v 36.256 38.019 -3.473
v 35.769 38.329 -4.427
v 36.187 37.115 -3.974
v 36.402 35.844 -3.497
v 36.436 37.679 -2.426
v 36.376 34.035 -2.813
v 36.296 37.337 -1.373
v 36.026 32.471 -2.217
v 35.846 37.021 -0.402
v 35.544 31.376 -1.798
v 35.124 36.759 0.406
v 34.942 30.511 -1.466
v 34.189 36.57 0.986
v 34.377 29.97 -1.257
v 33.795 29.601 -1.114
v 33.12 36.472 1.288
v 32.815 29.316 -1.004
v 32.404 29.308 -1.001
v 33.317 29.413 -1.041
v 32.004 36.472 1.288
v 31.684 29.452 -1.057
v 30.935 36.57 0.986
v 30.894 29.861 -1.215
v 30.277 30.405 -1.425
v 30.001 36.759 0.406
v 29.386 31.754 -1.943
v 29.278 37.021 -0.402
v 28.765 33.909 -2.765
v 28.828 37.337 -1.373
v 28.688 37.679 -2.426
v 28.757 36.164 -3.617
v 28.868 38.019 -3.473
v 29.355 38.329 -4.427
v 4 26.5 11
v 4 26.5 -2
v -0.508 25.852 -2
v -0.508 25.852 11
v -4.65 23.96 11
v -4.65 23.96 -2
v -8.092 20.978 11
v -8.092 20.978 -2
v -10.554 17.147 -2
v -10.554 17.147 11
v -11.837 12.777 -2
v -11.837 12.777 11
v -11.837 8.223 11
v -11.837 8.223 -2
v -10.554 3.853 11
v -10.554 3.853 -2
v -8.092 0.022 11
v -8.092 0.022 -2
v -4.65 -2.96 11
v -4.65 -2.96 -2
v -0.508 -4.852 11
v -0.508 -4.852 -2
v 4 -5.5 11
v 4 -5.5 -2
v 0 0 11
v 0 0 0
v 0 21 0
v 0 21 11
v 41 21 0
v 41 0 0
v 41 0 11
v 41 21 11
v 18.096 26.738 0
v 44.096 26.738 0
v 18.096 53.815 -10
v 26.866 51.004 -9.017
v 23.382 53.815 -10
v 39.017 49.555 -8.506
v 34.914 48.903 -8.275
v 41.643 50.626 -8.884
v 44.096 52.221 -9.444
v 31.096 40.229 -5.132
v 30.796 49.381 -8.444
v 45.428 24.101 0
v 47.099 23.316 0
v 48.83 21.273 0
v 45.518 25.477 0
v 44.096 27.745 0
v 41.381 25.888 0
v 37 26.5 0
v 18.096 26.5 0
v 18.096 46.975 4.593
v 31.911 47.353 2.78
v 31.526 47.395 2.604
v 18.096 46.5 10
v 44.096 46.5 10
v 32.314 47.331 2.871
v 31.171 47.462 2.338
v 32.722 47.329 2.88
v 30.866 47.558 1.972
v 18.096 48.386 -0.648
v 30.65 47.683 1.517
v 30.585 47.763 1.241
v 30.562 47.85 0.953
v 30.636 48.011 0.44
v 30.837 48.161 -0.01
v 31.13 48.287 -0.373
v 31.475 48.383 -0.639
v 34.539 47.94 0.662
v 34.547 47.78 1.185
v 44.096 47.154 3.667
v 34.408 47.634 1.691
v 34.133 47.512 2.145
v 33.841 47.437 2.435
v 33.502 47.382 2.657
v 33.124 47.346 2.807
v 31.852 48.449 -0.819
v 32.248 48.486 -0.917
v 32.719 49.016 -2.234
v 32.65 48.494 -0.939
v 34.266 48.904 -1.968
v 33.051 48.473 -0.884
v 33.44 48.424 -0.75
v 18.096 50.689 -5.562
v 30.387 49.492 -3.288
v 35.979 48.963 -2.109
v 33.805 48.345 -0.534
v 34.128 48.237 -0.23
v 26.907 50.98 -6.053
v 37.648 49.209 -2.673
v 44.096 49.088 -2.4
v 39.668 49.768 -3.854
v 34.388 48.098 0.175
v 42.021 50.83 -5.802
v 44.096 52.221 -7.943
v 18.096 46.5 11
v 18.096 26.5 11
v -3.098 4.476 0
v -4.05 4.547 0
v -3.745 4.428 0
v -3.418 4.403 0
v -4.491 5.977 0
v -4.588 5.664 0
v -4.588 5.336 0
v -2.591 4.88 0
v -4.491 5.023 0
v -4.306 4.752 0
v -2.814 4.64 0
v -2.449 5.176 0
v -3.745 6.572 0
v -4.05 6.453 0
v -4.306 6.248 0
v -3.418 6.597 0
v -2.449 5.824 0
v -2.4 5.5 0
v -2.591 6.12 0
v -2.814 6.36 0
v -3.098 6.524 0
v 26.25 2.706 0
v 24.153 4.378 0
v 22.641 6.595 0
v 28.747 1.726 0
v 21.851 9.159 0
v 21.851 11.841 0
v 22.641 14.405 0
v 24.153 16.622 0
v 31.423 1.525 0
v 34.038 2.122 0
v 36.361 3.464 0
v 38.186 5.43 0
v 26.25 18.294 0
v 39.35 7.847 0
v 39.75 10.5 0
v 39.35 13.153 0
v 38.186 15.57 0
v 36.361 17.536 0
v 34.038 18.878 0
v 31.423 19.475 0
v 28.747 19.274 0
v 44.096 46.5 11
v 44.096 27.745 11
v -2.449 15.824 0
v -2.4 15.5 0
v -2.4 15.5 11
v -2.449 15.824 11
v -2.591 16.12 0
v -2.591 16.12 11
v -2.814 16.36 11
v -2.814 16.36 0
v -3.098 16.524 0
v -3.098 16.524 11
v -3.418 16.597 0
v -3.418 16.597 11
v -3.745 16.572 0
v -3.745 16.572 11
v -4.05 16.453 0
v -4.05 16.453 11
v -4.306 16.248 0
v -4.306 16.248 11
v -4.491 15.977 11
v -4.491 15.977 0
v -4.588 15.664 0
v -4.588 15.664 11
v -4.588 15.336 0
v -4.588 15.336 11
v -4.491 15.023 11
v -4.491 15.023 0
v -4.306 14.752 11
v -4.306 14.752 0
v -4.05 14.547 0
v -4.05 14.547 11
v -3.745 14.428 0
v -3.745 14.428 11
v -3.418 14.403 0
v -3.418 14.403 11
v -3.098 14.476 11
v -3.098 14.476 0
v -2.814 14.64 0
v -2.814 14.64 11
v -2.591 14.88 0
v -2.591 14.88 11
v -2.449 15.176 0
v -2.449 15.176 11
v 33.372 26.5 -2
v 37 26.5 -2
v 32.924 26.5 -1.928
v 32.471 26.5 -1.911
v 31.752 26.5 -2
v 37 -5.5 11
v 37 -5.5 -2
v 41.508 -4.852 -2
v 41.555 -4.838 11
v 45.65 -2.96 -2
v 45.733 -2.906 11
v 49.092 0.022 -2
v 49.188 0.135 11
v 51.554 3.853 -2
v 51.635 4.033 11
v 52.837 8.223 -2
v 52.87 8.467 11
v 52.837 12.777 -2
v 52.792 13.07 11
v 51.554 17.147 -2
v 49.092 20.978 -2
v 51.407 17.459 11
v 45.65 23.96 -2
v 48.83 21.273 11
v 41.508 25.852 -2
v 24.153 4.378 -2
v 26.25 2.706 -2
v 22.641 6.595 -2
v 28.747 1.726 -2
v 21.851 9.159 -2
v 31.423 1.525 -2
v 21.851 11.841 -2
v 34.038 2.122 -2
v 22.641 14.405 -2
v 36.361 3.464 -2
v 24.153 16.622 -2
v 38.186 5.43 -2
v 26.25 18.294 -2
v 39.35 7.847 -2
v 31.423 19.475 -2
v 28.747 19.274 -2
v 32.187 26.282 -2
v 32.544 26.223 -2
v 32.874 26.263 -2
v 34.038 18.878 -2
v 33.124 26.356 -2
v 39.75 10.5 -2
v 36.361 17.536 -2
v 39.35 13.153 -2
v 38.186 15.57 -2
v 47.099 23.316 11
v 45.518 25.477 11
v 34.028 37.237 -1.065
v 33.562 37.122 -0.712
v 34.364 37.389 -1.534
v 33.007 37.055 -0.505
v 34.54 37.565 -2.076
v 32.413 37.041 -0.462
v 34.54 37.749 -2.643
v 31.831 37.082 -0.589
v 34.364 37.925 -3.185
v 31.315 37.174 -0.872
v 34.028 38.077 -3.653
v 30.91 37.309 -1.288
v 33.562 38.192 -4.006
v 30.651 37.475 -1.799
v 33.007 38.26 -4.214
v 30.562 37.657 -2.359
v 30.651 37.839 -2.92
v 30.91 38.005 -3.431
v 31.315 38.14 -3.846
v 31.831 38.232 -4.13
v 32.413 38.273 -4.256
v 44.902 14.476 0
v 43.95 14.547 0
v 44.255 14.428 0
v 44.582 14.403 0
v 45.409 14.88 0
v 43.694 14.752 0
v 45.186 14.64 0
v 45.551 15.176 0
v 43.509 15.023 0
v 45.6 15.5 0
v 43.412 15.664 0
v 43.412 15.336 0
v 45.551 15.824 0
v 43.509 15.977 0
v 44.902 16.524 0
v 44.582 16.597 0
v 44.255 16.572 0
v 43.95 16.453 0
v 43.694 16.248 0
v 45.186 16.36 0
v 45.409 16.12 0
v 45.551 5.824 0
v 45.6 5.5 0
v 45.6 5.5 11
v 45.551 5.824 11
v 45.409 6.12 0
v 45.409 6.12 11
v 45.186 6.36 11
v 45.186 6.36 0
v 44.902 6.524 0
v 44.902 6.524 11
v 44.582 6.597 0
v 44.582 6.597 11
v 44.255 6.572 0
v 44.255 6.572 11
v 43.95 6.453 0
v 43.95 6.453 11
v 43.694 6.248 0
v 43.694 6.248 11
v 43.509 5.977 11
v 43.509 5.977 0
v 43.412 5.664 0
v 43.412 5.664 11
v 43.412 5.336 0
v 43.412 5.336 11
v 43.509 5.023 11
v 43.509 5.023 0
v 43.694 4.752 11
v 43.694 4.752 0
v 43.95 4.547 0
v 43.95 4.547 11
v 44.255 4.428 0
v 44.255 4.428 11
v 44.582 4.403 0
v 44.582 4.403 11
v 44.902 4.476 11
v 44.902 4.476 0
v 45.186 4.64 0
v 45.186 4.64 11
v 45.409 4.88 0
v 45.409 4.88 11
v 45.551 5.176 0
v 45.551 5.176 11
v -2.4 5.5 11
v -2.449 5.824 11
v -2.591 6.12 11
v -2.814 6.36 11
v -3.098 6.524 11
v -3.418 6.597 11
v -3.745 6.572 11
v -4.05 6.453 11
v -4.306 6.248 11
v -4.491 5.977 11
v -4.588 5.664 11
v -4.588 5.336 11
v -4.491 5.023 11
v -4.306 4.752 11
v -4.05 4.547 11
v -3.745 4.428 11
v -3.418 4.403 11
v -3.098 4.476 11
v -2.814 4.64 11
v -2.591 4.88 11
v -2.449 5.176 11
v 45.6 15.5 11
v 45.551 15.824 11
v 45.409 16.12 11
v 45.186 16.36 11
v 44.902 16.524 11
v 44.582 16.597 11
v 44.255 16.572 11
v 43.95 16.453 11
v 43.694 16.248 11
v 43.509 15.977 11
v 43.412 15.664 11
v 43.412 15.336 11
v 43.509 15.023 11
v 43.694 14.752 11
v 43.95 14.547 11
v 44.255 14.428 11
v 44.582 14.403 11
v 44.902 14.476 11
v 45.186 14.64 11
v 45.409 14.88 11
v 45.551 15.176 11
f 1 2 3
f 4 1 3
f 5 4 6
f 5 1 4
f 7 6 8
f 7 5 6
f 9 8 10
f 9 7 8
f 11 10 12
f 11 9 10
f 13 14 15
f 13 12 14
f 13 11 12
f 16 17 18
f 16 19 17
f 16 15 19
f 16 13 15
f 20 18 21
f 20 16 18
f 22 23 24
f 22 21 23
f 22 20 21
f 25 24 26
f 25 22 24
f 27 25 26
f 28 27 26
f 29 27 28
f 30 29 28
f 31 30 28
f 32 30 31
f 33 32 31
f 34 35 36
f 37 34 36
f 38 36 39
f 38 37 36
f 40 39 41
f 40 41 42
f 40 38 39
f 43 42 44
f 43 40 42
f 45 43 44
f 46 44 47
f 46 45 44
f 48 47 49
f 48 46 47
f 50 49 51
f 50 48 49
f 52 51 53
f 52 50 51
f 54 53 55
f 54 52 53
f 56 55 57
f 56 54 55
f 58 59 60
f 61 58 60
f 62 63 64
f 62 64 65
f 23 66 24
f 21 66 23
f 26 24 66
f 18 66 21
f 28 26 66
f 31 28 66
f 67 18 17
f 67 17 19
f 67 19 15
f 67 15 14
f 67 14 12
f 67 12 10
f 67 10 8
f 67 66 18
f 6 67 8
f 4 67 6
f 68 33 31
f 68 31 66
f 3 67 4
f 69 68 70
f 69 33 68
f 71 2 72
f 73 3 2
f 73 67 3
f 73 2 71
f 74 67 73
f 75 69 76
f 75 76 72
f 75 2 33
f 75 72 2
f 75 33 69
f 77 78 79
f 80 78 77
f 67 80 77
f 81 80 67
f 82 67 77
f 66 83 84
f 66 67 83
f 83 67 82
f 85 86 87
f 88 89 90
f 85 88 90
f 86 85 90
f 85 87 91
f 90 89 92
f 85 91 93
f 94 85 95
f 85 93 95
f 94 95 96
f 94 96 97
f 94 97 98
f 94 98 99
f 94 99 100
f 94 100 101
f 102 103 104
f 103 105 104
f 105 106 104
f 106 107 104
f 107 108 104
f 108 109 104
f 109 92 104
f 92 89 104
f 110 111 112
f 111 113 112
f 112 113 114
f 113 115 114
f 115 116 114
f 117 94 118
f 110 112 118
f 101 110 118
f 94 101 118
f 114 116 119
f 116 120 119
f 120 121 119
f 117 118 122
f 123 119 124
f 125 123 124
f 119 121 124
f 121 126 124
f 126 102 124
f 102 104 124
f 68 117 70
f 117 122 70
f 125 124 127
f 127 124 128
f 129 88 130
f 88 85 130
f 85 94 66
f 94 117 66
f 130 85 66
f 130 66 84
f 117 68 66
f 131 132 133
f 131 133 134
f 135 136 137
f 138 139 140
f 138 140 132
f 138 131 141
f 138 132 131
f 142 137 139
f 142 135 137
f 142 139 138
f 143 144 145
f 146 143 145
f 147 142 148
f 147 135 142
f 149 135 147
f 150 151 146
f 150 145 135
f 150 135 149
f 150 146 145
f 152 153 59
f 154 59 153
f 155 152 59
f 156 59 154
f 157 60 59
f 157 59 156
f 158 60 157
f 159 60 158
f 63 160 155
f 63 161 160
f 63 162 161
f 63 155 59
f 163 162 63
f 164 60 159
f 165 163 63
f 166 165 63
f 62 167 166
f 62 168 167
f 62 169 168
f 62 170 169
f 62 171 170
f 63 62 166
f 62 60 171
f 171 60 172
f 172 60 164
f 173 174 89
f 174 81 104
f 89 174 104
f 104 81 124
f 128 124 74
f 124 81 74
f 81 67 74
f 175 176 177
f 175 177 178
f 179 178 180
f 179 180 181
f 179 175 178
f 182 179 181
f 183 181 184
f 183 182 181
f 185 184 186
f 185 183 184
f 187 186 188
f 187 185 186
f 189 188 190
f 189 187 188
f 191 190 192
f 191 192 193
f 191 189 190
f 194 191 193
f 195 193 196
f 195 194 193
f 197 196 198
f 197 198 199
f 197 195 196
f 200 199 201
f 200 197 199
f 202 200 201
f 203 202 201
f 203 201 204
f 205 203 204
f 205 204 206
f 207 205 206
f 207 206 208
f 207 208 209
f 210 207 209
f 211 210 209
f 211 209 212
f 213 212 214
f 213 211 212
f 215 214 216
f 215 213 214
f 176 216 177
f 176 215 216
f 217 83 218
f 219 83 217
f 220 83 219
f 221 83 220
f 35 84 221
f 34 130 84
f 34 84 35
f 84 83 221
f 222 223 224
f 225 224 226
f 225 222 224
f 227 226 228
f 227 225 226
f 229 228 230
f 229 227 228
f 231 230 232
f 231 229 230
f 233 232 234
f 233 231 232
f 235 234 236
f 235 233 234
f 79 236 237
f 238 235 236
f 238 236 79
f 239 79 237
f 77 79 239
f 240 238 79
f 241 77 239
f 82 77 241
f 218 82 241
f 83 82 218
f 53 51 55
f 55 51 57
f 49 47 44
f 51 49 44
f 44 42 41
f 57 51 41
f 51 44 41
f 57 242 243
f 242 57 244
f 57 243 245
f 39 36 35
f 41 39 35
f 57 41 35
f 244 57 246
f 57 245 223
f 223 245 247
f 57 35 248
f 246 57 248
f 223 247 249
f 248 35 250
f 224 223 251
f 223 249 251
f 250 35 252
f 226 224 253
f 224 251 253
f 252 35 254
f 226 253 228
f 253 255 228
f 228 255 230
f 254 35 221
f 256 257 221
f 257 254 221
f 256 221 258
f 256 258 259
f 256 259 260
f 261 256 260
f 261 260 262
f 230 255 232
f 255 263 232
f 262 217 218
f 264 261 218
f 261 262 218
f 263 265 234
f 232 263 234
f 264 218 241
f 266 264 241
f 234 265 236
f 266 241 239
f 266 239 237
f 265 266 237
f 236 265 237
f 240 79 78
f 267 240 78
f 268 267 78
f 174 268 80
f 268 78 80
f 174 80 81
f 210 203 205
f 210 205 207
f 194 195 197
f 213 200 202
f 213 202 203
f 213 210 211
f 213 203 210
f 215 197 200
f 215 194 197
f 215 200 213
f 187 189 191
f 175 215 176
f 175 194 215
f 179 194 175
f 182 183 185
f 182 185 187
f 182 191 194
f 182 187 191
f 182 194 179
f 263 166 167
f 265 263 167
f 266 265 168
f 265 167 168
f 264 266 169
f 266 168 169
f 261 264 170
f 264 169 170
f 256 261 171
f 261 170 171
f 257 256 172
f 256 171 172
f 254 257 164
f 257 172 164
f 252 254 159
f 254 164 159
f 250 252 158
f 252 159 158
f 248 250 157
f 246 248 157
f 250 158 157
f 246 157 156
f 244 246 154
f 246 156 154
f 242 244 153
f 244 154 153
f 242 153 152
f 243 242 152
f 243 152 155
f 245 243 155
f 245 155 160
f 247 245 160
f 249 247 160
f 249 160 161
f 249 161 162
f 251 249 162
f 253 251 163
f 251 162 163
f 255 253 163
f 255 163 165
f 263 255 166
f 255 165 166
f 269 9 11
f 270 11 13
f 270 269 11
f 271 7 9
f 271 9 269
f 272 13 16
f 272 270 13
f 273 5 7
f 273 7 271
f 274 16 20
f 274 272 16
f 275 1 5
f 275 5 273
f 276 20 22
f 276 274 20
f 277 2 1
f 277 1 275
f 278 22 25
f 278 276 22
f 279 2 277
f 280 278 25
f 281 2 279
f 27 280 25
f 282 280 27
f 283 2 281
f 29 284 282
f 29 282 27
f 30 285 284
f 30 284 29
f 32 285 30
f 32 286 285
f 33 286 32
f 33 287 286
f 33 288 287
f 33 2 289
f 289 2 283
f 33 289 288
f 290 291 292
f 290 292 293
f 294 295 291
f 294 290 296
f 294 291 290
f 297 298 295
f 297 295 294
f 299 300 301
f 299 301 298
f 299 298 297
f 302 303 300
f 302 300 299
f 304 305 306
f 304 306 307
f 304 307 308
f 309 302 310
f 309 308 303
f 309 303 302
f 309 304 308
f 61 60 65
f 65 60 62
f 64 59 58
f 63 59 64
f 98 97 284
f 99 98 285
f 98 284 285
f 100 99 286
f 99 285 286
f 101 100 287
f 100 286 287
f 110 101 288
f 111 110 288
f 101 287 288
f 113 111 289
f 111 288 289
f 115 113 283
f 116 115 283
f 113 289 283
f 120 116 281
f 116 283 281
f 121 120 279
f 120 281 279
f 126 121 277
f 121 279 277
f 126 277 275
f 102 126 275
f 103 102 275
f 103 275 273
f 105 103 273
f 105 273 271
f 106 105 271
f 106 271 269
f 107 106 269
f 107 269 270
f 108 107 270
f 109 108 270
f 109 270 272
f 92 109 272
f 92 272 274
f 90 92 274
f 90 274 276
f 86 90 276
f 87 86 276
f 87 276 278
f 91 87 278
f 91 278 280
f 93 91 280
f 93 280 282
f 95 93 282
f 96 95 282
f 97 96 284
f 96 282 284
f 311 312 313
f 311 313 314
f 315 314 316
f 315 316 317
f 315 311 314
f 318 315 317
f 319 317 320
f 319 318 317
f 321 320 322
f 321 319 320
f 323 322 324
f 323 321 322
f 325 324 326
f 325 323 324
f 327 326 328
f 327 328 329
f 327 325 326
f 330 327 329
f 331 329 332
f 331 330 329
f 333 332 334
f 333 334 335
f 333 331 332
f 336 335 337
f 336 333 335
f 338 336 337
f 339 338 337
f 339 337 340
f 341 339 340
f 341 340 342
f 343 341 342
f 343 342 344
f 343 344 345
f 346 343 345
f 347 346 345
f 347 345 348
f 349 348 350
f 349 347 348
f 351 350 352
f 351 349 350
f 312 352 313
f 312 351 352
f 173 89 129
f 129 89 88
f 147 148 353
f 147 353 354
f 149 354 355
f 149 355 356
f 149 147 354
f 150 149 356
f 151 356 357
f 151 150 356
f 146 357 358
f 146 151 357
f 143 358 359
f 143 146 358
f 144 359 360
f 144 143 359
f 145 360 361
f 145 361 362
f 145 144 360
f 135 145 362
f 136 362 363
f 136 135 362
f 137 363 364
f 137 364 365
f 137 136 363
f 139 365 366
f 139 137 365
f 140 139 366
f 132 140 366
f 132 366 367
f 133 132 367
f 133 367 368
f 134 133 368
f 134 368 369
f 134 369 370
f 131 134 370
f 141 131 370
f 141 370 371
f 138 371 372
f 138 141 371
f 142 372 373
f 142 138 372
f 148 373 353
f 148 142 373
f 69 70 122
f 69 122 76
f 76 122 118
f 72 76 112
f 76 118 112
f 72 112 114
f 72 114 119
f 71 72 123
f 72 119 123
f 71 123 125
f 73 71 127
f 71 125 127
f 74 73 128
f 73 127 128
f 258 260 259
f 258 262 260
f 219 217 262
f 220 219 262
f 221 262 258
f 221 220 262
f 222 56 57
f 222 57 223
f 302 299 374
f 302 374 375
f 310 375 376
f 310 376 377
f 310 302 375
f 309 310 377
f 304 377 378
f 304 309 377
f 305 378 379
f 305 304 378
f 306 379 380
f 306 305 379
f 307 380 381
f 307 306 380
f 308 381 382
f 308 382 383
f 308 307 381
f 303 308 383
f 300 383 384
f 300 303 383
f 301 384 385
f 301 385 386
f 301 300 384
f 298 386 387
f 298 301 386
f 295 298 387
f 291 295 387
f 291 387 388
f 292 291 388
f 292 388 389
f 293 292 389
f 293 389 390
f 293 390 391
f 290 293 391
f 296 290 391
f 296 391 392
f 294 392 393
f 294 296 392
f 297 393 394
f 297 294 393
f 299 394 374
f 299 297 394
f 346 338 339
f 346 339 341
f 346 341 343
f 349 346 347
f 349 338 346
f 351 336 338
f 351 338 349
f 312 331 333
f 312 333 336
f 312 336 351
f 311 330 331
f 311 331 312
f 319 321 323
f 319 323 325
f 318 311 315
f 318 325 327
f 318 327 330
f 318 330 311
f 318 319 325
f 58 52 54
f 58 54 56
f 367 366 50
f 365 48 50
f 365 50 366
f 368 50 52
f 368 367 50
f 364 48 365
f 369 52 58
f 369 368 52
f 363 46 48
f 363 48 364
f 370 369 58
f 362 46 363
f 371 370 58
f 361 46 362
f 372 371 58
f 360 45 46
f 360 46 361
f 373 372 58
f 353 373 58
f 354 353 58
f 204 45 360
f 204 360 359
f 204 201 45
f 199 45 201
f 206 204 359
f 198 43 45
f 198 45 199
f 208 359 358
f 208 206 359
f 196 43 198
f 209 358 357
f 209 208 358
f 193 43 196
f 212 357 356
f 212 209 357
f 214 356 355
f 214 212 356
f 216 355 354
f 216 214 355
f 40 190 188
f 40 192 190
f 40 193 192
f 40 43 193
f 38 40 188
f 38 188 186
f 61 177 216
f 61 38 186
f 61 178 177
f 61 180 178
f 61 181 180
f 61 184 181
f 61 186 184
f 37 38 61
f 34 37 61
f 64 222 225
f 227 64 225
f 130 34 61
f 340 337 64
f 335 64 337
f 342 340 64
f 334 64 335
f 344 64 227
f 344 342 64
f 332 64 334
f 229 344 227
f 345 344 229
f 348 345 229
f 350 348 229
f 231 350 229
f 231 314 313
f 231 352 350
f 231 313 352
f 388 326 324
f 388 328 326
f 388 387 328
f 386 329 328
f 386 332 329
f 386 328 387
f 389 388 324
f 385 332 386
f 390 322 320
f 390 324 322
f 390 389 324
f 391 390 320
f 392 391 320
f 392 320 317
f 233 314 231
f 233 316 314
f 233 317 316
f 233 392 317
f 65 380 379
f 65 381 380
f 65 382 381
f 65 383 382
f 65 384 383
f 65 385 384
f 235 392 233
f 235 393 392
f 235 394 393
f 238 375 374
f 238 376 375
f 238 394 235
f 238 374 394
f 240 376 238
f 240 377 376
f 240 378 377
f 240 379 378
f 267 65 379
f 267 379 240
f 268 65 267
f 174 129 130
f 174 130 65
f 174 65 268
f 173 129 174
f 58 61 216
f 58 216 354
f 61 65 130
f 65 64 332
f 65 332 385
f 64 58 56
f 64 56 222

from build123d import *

# Parameters (mm, degrees)
SKETCH1_R               = 1.1
SKETCH1_W               = 41
SKETCH1_H               = 21
BOSS_EXTRUDE1_DEPTH     = 11
SKETCH2_R               = 9.000000034
BOSS_EXTRUDE2_DEPTH     = 2
BOSS_EXTRUDE3_DEPTH     = 10
BOSS_EXTRUDE4_DEPTH     = 26
SKETCH6_R               = 15.25
CUT_EXTRUDE1_DEPTH      = 11.0000001
SKETCH8_R               = 2
CUT_EXTRUDE3_DEPTH      = 33.905944515
CUT_EXTRUDE3_DEPTH_BACK = 30.994912665
SKETCH11_R              = 3.875
SKETCH11_R_2            = 2
CUT_EXTRUDE4_DEPTH      = 15.37
BOSS_EXTRUDE6_DEPTH     = 1


with BuildPart() as part:
    # Sketch1 → Boss-Extrude1 (new body)
    with BuildSketch(Plane.XY):
        with BuildLine():
            Line((4, -5.500000004), (37, -5.500000004))
            ThreePointArc((37, -5.500000004), (53.000000004, 10.5), (37, 26.500000004))
            Line((37, 26.500000004), (4, 26.500000004))
            ThreePointArc((4, 26.500000004), (-12.000000004, 10.5), (4, -5.500000004))
        make_face()
        with Locations((-3.5, 15.5)):
            Circle(SKETCH1_R, mode=Mode.SUBTRACT)
        with Locations((-3.5, 5.5)):
            Circle(SKETCH1_R, mode=Mode.SUBTRACT)
        with Locations((44.5, 5.5)):
            Circle(SKETCH1_R, mode=Mode.SUBTRACT)
        with Locations((44.5, 15.5)):
            Circle(SKETCH1_R, mode=Mode.SUBTRACT)
        with Locations((20.5, 10.5)):
            Rectangle(SKETCH1_W, SKETCH1_H, mode=Mode.SUBTRACT)
    extrude(amount=BOSS_EXTRUDE1_DEPTH)

    # Sketch2 → Boss-Extrude2 (add)
    with BuildSketch(Plane.XY):
        with BuildLine():
            Line((37, 26.500000004), (4, 26.500000004))
            ThreePointArc((4, 26.500000004), (-12.000000004, 10.5), (4, -5.500000004))
            Line((4, -5.500000004), (37, -5.500000004))
            ThreePointArc((37, -5.500000004), (53.000000004, 10.5), (37, 26.500000004))
        make_face()
        with Locations((30.749999966, 10.5)):
            Circle(SKETCH2_R, mode=Mode.SUBTRACT)
    extrude(amount=-BOSS_EXTRUDE2_DEPTH)

    # Sketch3 → Boss-Extrude3 (add)
    with BuildSketch(Plane.XY):
        with BuildLine():
            Line((37, 26.500000004), (18.095900106, 26.500000004))
            Line((18.095900106, 26.500000004), (18.095900106, 46.500000004))
            Line((18.095900106, 46.500000004), (44.095900176, 46.500000004))
            Line((44.095900176, 46.500000004), (44.095900176, 27.744899316))
            ThreePointArc((44.095900176, 27.744899316), (46.289330037, 24.381962762), (48.82982939, 21.272888969))
            ThreePointArc((48.82982939, 21.272888969), (43.466597892, 25.134996134), (37, 26.500000004))
        make_face()
    extrude(amount=BOSS_EXTRUDE3_DEPTH)

    # Sketch5 → Boss-Extrude4 (add)
    with BuildSketch(Plane(origin=(44.095900176, 0, 0), x_dir=(0, 0, -1), z_dir=(1, 0, 0))):
        with BuildLine():
            Line((0, 26.737992109), (-10, 46.500000004))
            ThreePointArc((-10, 46.500000004), (0.647802696, 48.386011996), (10, 53.814561439))
            add(Edge.make_bspline(
                [(0, 26.737992109), (5.263715072, 40.18126942), (10, 53.814561439)],
                knots=[0, 0, 0, 1, 1, 1], degree=2))
        make_face()
    extrude(amount=-BOSS_EXTRUDE4_DEPTH)

    # Sketch6 → Cut-Extrude1 (cut, through all)
    with BuildSketch(Plane.XY):
        with Locations((34.595900106, 64.15000003)):
            Circle(SKETCH6_R)
    extrude(amount=-CUT_EXTRUDE1_DEPTH, mode=Mode.SUBTRACT)

    # Sketch8 → Cut-Extrude3 (cut, two sides)
    with BuildSketch(Plane(origin=(0, 23.381689927, 7.597171588), x_dir=(-1, 0, 0), z_dir=(0, -0.951056516, -0.309016994))) as cut_extrude3_sk:
        with Locations((-32.562075151, 13.880413242)):
            Circle(SKETCH8_R)
    extrude(amount=CUT_EXTRUDE3_DEPTH, mode=Mode.SUBTRACT)
    extrude(cut_extrude3_sk.sketch, amount=-CUT_EXTRUDE3_DEPTH_BACK, mode=Mode.SUBTRACT)

    # Sketch11 → Cut-Extrude4 (cut)
    with BuildSketch(Plane(origin=(0, 33.367783426, 10.841850055), x_dir=(-1, 0, 0), z_dir=(0, -0.951056516, -0.309016994))):
        with Locations((-32.562075151, 13.880413242)):
            Circle(SKETCH11_R)
        with Locations((-32.562075151, 13.880413242)):
            Circle(SKETCH11_R_2, mode=Mode.SUBTRACT)
    extrude(amount=CUT_EXTRUDE4_DEPTH, mode=Mode.SUBTRACT)

    # Sketch12 → Boss-Extrude6 (add)
    with BuildSketch(Plane.XY.offset(10)):
        with BuildLine():
            Line((44.095900176, 27.744899316), (44.095900176, 46.500000004))
            Line((44.095900176, 46.500000004), (18.095900106, 46.500000004))
            Line((18.095900106, 46.500000004), (18.095900106, 26.500000004))
            Line((18.095900106, 26.500000004), (37, 26.500000004))
            ThreePointArc((37, 26.500000004), (43.466597892, 25.134996134), (48.82982939, 21.272888969))
            ThreePointArc((48.82982939, 21.272888969), (46.289330037, 24.381962762), (44.095900176, 27.744899316))
        make_face()
    extrude(amount=BOSS_EXTRUDE6_DEPTH)


solid = part.part
